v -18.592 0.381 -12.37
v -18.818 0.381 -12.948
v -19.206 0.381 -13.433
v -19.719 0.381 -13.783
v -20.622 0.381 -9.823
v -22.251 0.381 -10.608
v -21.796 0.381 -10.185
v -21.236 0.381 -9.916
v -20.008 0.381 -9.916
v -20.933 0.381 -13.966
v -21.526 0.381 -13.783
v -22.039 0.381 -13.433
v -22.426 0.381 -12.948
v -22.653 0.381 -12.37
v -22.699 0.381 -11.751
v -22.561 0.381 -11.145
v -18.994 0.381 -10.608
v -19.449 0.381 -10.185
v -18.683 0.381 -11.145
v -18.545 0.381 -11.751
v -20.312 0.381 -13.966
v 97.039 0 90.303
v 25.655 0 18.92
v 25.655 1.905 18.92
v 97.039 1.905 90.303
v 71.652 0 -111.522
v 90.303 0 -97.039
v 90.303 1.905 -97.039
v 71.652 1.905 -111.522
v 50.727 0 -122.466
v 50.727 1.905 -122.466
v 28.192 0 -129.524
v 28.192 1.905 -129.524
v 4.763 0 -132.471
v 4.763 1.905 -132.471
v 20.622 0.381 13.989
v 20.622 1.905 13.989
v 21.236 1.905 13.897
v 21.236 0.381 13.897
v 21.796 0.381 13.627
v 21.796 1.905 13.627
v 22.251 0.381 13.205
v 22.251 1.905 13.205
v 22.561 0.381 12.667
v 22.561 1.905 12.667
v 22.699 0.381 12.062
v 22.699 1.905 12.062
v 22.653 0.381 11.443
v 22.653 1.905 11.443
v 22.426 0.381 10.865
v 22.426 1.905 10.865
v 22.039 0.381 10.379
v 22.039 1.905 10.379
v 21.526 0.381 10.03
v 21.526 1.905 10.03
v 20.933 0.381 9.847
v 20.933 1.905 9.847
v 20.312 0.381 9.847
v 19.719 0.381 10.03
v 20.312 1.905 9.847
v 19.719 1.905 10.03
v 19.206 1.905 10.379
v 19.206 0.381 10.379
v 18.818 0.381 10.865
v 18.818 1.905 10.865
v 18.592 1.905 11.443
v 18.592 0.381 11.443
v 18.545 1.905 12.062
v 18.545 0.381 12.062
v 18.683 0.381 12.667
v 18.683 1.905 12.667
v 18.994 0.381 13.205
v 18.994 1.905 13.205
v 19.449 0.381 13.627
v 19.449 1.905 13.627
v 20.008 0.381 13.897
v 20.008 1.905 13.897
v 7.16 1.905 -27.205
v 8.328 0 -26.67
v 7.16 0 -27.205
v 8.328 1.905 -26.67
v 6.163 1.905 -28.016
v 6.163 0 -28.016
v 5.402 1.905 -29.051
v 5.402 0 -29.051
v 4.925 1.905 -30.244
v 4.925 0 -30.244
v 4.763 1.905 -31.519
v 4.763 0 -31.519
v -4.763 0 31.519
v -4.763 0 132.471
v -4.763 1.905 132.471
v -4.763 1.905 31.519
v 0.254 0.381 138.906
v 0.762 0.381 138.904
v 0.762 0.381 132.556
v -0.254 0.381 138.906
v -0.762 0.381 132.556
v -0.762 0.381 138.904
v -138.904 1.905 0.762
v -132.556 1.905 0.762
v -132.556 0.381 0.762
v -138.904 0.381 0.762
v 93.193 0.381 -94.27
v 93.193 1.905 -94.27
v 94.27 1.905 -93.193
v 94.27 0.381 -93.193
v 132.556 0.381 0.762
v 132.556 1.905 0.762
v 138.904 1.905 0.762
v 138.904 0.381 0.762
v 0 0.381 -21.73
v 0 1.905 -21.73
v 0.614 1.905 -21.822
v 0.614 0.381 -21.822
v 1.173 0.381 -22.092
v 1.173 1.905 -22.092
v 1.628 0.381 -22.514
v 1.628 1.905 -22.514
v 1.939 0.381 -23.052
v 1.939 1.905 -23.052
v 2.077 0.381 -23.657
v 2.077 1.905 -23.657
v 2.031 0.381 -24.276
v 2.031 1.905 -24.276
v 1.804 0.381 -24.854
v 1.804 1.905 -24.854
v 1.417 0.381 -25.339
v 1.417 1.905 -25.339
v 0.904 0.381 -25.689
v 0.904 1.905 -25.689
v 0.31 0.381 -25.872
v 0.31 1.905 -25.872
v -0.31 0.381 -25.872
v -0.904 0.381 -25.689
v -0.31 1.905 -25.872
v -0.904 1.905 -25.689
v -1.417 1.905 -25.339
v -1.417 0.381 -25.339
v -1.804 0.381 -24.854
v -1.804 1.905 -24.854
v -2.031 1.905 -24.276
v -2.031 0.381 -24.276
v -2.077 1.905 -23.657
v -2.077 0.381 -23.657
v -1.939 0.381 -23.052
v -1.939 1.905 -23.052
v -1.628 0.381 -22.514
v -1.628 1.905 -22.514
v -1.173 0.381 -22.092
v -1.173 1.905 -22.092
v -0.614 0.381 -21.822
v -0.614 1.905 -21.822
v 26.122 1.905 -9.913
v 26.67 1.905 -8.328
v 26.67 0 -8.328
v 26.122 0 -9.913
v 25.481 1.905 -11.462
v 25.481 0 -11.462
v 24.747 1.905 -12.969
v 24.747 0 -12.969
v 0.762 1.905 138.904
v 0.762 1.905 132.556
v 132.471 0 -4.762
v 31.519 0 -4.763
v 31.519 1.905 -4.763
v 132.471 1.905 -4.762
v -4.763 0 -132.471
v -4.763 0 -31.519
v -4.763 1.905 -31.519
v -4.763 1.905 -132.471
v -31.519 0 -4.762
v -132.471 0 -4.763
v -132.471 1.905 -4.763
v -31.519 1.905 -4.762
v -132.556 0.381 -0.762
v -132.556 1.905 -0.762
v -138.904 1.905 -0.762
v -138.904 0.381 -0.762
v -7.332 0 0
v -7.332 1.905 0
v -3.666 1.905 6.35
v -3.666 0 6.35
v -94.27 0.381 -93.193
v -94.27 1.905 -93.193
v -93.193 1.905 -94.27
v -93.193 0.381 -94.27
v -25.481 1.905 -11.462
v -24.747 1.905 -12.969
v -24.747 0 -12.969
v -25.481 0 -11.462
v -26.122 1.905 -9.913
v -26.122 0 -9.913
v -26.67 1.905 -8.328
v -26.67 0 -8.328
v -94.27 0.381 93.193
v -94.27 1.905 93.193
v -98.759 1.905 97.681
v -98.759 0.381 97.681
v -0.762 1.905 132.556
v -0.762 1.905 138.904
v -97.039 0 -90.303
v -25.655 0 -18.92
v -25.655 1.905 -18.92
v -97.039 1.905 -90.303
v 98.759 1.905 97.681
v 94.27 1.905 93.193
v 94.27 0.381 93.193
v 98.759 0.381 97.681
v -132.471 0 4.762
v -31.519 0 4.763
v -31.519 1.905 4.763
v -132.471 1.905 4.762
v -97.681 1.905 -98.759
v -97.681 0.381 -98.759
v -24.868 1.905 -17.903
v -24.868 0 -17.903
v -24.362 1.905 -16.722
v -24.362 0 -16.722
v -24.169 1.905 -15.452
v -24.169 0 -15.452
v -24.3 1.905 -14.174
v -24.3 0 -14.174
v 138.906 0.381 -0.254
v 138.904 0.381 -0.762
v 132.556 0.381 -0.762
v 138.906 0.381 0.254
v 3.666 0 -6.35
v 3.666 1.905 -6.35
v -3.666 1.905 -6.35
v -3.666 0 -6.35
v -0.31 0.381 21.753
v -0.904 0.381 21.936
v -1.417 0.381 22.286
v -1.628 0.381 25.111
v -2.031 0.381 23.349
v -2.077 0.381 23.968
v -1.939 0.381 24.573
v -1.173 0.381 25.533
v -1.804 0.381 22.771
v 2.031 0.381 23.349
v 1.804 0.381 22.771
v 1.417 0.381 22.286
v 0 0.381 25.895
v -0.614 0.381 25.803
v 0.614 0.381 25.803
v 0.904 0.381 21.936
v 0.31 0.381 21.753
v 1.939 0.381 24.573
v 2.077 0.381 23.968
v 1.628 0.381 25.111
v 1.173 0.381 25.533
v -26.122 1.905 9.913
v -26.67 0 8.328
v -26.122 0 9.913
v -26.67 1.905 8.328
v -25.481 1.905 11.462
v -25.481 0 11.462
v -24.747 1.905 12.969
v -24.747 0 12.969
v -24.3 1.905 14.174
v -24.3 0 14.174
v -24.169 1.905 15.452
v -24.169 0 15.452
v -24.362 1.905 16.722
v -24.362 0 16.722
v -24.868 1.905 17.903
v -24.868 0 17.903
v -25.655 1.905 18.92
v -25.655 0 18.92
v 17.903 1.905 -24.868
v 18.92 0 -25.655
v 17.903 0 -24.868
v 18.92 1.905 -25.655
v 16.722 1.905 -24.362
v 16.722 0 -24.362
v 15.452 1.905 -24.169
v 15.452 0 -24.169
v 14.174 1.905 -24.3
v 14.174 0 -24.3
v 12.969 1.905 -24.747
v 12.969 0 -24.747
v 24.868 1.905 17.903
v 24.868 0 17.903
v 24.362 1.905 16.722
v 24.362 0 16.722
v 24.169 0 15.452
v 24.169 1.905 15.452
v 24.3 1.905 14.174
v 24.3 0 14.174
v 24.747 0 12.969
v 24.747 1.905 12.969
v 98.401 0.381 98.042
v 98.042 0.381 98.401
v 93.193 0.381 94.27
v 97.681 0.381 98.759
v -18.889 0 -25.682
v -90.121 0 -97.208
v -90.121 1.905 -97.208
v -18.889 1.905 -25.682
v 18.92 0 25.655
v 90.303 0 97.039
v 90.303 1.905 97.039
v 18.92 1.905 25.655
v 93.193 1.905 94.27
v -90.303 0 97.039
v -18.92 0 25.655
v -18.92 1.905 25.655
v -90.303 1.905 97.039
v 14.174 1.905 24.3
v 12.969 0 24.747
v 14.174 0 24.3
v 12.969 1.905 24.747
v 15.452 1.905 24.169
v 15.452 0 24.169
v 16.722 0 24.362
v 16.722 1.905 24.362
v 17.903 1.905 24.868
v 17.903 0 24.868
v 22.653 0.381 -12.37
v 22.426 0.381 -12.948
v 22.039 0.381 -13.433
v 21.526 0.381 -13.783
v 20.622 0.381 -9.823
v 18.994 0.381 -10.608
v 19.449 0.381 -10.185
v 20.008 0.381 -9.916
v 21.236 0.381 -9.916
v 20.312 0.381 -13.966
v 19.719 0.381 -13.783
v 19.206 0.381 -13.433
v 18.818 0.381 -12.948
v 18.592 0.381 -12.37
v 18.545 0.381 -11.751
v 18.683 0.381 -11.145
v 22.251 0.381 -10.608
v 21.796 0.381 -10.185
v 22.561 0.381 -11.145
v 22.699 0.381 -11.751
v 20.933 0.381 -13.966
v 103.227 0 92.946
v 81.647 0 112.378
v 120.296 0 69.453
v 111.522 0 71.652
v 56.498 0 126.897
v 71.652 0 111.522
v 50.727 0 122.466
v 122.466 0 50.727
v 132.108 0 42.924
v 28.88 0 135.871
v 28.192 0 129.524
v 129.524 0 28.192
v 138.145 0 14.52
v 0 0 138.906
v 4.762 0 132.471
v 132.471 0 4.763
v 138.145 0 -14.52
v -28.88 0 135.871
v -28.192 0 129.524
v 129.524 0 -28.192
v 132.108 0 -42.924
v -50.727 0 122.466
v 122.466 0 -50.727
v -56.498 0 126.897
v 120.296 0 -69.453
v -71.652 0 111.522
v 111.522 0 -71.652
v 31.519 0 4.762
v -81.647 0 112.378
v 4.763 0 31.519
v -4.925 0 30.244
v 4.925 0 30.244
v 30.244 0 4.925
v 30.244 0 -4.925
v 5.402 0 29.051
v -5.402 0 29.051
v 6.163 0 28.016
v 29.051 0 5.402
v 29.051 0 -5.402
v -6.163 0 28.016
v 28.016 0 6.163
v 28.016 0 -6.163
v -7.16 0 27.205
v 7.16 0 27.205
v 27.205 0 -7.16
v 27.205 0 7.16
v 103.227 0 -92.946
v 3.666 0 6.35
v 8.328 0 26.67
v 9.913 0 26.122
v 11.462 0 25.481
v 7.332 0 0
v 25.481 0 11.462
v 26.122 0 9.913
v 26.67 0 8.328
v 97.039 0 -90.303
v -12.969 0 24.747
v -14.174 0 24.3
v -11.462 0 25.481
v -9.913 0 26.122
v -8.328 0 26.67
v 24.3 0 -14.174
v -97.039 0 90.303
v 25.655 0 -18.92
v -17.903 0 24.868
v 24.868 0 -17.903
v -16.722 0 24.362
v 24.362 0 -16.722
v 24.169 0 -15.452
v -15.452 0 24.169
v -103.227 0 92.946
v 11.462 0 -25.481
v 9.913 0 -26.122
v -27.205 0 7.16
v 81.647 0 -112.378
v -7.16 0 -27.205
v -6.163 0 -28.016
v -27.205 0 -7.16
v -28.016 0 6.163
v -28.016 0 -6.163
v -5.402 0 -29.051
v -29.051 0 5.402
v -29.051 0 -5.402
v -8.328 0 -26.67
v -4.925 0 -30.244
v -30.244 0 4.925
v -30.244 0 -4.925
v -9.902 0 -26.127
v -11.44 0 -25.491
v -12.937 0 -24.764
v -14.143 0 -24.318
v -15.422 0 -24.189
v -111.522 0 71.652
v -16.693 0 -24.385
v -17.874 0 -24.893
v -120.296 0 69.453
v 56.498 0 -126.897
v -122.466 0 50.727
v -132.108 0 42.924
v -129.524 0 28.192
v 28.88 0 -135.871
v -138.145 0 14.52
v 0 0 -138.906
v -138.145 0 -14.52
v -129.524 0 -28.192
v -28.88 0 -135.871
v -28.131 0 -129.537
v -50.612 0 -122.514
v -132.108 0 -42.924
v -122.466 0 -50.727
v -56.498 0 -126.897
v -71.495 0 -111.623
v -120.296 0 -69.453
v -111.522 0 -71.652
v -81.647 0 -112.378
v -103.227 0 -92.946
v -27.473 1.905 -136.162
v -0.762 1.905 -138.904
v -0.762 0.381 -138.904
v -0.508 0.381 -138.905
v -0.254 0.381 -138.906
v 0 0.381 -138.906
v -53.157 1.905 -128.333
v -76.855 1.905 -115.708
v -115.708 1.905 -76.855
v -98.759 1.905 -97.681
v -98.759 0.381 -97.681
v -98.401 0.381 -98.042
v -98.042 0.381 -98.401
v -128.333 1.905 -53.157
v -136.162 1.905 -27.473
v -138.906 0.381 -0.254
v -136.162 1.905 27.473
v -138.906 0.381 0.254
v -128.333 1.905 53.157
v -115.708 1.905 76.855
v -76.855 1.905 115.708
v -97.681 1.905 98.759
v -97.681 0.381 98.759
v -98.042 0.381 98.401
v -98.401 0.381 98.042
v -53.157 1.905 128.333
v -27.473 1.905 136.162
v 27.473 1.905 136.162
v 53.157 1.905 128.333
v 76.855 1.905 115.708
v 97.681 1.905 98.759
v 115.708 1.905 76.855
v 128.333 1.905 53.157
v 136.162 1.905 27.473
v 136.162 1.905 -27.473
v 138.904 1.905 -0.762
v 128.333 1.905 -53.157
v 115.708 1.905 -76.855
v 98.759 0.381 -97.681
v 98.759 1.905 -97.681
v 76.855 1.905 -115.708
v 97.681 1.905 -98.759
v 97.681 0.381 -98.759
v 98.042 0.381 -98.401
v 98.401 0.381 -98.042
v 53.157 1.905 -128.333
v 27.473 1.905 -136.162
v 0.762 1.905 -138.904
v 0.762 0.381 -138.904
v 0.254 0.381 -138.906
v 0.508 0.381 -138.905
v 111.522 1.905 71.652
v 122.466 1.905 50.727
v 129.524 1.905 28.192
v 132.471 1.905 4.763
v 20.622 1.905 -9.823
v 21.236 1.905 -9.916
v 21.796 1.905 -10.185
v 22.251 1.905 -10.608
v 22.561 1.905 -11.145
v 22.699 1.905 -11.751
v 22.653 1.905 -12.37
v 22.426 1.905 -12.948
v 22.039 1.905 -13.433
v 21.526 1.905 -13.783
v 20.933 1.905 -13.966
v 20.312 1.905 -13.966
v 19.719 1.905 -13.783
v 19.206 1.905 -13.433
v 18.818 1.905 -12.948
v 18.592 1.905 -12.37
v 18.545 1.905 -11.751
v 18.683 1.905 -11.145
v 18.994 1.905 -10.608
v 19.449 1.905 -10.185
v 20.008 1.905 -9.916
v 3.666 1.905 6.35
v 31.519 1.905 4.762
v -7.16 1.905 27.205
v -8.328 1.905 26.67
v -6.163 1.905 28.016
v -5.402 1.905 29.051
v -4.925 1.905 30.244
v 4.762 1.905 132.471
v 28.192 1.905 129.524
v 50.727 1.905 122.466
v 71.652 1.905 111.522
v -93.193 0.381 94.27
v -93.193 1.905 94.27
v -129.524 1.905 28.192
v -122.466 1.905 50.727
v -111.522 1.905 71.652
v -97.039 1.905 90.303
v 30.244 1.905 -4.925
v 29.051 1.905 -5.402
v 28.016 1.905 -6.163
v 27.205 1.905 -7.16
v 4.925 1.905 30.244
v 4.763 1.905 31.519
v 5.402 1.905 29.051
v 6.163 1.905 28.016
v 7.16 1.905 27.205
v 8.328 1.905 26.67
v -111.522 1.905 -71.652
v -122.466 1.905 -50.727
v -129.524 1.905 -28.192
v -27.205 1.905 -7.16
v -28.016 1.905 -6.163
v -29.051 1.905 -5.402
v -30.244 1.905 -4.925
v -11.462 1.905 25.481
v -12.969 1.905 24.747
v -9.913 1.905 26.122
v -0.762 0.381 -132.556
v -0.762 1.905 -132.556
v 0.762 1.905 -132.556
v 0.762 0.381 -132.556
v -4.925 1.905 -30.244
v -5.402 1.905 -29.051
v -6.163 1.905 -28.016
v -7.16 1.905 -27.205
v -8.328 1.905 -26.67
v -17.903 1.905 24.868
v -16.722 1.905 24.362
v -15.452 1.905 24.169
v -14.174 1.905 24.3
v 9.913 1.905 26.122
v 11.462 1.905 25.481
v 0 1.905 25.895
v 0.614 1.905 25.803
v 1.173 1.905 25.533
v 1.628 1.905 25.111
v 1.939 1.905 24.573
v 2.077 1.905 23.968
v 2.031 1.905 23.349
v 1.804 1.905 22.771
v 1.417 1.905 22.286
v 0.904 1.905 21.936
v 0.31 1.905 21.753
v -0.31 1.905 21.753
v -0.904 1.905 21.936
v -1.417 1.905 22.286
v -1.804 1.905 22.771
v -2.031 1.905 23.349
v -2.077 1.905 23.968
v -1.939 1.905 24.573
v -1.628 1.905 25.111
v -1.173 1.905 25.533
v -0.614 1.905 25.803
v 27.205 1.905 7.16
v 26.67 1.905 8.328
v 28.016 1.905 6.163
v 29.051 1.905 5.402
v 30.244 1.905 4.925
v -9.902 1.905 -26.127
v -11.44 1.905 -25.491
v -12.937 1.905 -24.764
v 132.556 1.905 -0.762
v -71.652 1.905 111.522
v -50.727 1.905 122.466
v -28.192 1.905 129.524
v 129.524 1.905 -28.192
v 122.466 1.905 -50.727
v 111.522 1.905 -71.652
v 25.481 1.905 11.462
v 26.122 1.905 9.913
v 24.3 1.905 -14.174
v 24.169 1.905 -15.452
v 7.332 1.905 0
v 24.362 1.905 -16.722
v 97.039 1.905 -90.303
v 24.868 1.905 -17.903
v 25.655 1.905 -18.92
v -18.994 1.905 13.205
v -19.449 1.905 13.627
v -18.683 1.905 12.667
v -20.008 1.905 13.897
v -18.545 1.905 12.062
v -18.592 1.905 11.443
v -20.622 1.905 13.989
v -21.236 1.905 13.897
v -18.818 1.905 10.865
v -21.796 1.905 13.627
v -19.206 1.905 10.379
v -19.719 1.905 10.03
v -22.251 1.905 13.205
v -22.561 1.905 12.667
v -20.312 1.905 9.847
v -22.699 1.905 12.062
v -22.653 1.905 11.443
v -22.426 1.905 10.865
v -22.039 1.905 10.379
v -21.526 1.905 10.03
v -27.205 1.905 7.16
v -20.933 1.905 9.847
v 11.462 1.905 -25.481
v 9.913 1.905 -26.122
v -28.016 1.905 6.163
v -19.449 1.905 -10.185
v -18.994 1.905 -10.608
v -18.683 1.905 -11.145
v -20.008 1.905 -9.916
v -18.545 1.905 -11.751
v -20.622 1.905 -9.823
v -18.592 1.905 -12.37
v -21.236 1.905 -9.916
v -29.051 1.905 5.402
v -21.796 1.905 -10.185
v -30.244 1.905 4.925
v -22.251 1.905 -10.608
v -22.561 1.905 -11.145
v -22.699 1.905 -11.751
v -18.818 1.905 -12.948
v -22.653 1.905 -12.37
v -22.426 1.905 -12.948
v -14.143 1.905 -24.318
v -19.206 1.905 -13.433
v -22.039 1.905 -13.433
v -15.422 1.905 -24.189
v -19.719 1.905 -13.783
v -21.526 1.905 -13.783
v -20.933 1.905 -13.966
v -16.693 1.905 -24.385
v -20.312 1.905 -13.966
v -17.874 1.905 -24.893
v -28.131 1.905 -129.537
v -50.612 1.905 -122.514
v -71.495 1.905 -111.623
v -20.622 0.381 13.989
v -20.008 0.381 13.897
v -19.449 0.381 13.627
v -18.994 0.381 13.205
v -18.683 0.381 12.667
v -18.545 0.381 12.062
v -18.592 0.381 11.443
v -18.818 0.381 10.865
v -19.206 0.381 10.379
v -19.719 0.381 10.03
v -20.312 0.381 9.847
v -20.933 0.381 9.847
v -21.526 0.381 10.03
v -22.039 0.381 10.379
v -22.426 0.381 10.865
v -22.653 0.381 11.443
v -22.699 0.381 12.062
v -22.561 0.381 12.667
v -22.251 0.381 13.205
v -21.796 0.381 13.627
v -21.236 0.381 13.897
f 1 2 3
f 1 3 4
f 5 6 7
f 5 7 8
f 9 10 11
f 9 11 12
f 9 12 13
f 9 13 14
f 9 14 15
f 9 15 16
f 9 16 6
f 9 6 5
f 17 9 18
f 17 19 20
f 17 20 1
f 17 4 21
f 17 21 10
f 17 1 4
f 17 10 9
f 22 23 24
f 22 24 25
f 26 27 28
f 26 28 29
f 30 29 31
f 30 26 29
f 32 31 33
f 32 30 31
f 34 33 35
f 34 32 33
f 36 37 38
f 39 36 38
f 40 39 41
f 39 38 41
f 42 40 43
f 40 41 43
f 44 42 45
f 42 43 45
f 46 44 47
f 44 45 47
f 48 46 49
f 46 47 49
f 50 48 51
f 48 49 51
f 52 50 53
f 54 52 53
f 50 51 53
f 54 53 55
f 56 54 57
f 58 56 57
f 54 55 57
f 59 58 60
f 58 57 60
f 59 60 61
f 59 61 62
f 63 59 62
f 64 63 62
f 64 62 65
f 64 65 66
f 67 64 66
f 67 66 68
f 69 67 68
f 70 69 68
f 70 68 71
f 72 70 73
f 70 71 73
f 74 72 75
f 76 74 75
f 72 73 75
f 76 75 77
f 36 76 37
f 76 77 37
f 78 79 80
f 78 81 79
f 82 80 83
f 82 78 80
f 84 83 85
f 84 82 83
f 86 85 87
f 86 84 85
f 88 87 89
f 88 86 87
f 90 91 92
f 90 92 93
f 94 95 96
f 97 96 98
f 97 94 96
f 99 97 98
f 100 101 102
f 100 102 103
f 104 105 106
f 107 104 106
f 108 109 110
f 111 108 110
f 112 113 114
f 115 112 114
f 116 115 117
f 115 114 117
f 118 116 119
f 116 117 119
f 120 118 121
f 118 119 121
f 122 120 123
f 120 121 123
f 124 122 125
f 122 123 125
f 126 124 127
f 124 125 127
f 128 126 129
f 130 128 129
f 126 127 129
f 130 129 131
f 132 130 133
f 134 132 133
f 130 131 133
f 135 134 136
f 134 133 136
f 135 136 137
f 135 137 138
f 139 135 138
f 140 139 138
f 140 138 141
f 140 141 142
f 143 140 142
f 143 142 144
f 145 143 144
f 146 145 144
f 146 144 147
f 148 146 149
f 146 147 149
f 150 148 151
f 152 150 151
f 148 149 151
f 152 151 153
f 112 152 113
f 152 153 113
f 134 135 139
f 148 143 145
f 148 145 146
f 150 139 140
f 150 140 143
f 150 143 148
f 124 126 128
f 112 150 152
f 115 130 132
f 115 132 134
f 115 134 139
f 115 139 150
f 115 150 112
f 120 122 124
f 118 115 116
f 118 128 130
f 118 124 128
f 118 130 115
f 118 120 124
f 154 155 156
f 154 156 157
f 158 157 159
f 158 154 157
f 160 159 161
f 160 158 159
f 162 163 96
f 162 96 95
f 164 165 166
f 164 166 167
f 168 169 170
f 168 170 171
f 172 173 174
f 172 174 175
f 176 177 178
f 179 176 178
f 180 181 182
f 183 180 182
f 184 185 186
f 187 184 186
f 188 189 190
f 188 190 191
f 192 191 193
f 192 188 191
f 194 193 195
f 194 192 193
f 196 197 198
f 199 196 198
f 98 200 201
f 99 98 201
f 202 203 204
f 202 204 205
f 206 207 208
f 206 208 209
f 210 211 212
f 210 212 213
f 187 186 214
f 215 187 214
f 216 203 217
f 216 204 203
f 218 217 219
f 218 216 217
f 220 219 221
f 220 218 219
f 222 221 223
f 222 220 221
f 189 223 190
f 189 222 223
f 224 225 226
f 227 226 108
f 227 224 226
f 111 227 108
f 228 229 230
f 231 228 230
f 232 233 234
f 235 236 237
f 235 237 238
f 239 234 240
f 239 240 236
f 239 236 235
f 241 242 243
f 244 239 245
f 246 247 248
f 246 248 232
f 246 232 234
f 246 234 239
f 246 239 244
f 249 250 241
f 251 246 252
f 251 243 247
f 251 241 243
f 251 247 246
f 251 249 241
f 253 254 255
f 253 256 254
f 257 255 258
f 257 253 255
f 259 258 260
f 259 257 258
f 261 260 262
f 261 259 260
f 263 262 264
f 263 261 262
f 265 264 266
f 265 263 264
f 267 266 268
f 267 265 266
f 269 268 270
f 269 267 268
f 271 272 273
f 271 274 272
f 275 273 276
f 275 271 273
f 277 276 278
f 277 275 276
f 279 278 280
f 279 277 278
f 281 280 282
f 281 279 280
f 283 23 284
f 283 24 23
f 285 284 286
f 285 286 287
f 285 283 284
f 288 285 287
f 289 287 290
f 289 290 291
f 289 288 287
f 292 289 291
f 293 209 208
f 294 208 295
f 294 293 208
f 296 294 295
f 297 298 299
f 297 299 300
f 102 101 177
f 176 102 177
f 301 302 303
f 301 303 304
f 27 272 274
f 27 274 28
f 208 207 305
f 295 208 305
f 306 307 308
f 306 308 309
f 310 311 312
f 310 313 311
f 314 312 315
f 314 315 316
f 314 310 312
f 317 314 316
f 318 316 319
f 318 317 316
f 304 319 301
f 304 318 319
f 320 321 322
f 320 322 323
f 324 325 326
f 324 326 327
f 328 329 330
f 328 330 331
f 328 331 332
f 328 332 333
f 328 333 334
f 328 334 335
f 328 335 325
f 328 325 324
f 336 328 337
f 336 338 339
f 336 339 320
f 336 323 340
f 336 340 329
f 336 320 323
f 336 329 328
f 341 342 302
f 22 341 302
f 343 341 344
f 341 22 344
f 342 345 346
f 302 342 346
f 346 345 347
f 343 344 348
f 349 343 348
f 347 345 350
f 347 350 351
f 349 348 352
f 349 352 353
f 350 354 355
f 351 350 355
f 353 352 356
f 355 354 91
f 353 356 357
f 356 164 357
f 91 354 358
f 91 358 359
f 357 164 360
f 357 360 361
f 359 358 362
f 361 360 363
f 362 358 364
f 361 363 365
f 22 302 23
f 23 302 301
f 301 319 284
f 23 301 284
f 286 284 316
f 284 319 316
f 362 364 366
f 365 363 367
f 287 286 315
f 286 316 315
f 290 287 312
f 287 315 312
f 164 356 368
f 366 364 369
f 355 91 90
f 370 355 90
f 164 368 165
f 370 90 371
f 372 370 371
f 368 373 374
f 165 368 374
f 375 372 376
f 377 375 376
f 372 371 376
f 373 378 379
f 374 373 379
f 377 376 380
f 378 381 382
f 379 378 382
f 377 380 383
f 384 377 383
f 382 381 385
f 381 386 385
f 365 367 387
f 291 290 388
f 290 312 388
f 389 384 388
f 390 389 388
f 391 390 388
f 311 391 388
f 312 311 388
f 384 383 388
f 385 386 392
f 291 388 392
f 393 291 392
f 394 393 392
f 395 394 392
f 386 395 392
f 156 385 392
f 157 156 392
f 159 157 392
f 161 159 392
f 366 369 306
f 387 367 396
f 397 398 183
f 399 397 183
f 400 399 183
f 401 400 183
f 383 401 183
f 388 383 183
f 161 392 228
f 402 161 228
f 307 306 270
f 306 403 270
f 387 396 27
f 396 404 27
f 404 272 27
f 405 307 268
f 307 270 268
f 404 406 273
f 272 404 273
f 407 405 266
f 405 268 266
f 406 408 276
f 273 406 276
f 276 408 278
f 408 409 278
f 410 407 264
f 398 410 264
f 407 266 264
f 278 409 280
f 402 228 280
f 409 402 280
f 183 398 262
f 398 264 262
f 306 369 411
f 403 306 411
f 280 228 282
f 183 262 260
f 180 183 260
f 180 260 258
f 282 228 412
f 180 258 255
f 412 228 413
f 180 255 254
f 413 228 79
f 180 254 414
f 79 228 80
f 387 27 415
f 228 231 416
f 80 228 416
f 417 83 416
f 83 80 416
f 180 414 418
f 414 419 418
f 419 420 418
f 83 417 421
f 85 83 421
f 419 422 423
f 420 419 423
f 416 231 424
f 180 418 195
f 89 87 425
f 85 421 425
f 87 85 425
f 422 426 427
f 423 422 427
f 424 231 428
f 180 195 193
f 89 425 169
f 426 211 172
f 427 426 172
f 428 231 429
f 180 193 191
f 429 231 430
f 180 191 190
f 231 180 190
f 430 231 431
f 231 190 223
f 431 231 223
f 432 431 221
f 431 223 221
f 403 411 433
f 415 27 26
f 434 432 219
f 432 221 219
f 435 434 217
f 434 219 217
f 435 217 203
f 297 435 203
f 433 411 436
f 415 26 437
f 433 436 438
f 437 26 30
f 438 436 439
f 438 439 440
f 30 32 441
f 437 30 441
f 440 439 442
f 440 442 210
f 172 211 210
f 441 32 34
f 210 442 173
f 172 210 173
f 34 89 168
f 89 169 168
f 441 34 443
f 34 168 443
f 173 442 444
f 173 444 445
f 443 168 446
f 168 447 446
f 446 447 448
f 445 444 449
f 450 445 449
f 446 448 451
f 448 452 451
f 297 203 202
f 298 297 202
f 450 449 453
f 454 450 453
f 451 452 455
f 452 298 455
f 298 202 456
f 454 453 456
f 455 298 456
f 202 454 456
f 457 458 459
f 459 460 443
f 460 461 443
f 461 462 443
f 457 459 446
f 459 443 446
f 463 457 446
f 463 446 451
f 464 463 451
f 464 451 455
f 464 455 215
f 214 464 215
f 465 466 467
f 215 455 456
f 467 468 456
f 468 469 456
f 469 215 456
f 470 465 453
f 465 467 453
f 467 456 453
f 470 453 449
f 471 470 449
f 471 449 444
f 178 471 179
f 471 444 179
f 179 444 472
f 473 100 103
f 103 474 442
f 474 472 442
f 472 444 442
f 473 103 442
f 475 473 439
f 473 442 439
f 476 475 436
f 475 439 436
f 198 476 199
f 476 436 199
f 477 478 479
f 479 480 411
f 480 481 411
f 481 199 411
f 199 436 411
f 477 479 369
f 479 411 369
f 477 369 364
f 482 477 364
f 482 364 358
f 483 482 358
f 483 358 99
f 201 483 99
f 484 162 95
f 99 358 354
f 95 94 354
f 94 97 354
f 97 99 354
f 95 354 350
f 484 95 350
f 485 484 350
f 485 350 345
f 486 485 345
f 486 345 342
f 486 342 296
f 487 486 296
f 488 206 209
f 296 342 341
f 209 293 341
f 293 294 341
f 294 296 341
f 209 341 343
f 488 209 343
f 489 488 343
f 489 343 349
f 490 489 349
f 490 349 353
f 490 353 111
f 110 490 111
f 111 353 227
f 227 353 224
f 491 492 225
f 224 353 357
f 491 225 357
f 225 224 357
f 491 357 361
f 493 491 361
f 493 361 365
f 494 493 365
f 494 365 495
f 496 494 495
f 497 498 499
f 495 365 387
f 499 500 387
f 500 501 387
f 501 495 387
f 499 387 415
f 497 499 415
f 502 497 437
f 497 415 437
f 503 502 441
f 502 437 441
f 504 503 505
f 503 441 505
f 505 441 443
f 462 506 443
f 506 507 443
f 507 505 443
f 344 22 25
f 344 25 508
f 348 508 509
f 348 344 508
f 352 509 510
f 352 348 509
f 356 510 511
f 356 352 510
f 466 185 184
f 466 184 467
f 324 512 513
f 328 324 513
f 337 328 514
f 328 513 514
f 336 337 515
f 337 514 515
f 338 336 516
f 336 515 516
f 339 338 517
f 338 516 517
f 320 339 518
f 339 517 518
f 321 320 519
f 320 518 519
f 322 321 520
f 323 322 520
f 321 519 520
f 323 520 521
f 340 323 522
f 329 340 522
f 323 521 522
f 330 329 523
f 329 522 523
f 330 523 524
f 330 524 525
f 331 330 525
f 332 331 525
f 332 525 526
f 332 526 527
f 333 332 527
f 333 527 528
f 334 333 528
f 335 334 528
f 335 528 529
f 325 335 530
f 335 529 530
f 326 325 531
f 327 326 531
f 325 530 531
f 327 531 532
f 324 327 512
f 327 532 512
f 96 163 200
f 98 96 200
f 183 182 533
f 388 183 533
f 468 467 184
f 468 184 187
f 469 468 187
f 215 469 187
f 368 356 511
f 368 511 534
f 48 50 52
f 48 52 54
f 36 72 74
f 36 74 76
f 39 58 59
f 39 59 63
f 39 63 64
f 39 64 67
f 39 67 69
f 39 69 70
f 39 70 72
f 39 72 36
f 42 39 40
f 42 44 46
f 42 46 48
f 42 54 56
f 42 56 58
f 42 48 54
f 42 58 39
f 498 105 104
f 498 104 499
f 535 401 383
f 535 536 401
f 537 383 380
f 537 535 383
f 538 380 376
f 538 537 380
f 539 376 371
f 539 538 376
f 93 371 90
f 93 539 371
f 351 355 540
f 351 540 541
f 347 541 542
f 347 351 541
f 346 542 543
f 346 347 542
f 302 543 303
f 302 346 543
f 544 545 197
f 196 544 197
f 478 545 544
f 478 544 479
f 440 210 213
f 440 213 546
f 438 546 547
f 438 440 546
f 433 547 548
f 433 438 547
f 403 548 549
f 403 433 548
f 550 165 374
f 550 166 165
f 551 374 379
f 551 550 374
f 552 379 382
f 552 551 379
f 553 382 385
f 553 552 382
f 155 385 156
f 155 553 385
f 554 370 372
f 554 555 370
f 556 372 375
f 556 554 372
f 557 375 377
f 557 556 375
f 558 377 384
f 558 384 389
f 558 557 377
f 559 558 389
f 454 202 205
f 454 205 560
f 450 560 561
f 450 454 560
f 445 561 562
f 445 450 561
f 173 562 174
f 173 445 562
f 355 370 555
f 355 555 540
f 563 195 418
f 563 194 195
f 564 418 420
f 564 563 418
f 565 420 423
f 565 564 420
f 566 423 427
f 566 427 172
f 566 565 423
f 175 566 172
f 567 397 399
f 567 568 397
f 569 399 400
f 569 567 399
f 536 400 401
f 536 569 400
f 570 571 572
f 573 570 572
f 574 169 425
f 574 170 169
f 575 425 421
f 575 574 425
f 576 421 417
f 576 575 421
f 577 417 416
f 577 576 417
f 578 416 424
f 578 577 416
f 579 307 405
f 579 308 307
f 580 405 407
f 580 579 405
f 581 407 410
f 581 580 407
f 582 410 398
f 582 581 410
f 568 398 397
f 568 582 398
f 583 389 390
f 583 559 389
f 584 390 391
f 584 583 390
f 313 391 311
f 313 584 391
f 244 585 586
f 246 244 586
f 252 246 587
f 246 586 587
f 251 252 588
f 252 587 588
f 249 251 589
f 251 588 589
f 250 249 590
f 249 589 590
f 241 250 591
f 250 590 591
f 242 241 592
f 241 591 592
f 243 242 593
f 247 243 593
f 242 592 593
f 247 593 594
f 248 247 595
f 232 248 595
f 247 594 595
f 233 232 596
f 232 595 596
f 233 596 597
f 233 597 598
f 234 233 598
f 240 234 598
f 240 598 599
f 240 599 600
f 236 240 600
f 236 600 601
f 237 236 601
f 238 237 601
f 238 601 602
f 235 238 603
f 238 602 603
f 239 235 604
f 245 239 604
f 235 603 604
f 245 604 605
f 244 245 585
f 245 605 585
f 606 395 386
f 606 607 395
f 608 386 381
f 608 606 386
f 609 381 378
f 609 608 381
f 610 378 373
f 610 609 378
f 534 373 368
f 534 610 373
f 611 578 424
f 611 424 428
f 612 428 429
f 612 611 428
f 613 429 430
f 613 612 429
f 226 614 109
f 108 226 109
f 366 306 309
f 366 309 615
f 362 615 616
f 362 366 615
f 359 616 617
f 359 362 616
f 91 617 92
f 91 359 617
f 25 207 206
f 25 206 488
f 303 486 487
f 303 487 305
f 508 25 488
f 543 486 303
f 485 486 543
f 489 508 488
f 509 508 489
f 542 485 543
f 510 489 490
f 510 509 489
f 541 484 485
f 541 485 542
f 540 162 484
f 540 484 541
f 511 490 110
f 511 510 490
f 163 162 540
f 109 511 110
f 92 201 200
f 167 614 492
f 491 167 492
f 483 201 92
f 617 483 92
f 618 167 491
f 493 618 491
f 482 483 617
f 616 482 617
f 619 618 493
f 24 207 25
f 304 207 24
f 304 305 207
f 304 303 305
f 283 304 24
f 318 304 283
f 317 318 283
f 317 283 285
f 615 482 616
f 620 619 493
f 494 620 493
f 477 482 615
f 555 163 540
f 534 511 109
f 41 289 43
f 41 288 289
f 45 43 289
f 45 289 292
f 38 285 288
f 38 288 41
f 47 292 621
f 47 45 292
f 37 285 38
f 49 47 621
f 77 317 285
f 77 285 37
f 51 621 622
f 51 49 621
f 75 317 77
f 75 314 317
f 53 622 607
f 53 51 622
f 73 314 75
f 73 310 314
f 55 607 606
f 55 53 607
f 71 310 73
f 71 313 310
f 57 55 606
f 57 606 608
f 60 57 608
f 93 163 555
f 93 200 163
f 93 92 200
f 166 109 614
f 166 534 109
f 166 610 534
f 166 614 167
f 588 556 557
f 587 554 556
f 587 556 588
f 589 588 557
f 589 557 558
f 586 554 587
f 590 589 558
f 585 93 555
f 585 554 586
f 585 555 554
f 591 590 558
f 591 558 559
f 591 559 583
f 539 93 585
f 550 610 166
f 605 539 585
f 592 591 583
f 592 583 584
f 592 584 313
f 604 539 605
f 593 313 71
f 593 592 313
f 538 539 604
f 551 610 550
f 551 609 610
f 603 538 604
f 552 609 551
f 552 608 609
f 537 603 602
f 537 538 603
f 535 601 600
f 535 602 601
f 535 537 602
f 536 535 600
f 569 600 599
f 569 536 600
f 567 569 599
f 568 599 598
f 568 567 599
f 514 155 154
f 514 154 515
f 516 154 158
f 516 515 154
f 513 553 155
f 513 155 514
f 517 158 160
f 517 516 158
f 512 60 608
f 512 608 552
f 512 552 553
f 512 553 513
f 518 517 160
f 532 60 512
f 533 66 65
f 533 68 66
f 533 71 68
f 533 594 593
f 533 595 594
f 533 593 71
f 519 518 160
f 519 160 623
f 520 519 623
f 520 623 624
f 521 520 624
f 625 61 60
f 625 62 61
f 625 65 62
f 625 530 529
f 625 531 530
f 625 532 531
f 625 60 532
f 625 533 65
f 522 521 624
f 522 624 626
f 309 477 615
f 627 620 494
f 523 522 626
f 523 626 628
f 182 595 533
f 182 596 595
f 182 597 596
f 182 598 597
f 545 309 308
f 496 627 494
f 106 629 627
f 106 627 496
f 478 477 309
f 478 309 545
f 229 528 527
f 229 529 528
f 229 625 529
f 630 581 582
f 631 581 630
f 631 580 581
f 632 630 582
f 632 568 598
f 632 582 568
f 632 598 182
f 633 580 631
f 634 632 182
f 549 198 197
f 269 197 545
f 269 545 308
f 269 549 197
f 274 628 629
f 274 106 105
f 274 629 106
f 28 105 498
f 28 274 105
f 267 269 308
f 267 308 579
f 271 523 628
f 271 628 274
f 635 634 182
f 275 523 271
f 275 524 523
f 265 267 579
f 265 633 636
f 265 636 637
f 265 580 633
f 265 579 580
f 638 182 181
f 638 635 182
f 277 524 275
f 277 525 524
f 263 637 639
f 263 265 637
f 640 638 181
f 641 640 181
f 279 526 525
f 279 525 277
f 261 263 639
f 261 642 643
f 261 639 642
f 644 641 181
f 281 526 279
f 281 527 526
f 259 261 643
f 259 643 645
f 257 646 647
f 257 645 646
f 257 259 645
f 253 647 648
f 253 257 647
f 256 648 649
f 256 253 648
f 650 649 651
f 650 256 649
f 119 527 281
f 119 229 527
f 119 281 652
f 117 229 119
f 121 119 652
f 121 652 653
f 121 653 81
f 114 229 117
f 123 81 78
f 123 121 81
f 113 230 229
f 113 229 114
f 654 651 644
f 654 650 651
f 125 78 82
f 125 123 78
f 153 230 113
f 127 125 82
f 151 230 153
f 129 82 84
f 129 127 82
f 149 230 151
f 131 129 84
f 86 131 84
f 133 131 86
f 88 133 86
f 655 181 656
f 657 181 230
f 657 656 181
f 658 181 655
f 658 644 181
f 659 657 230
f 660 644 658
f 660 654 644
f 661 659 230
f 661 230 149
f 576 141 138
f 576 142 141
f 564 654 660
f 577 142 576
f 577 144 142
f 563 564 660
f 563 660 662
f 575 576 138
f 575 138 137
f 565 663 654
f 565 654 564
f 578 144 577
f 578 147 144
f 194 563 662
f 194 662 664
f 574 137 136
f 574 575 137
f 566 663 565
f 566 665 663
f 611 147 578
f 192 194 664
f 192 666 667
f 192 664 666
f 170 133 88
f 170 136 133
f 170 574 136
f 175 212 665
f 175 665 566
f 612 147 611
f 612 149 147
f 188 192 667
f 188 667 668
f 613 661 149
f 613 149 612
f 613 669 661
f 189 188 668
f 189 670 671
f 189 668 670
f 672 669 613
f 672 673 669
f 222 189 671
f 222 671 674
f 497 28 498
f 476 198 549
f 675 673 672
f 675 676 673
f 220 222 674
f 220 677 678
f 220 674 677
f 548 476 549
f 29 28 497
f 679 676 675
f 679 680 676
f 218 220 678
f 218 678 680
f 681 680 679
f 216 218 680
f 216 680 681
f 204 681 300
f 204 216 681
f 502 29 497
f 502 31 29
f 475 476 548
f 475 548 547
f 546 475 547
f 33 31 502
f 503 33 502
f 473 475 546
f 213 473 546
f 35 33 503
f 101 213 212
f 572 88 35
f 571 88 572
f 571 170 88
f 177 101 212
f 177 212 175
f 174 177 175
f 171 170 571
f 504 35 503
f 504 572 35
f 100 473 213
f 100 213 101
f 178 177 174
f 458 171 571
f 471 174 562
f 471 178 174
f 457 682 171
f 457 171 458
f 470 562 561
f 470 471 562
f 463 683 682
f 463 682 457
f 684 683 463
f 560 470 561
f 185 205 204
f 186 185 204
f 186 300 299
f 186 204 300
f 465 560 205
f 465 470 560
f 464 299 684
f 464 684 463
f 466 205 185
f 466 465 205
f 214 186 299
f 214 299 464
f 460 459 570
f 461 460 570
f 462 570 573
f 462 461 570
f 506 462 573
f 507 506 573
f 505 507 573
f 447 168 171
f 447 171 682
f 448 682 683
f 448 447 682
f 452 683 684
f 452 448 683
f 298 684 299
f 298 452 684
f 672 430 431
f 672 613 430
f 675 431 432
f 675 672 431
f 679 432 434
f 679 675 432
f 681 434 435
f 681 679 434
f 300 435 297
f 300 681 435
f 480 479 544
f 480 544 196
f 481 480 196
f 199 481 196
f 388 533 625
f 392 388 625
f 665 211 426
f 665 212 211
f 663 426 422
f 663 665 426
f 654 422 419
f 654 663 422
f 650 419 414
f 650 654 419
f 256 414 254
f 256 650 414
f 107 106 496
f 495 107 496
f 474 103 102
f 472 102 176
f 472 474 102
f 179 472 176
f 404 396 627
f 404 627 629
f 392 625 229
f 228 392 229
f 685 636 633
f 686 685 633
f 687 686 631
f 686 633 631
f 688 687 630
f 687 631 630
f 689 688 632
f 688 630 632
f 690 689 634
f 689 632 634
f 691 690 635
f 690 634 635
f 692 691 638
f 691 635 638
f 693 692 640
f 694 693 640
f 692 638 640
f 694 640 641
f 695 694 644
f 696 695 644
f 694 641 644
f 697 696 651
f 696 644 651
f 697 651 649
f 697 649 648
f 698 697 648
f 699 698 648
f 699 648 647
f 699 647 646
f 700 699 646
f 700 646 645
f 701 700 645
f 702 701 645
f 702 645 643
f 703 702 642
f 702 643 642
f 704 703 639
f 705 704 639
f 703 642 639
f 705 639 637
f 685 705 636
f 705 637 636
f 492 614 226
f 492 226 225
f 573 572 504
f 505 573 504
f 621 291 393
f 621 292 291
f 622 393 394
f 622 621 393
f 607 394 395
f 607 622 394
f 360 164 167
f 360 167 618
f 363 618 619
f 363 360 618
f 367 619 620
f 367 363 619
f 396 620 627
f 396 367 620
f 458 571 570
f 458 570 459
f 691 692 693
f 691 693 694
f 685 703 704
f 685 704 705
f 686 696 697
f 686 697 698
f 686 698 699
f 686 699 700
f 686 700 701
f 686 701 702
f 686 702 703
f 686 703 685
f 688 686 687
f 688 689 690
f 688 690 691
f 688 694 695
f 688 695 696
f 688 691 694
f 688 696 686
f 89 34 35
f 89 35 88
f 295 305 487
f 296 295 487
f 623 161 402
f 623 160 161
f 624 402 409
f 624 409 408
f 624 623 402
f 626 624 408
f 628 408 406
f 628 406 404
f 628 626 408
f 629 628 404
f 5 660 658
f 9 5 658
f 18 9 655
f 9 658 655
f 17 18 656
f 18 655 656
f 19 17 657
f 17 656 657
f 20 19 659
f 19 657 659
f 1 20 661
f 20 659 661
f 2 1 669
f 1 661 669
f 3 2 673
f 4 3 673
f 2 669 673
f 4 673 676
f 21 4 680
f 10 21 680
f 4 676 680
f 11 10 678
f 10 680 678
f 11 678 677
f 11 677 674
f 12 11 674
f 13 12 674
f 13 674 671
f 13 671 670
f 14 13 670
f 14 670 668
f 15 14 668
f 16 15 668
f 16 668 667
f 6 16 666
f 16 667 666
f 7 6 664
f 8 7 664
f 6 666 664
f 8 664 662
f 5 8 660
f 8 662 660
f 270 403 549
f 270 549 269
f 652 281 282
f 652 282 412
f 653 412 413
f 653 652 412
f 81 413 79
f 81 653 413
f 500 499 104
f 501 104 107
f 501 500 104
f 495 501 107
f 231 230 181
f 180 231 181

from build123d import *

# Parameters (mm, degrees)
SKETCH1_R           = 138.90625
BOSS_EXTRUDE1_DEPTH = 1.905
SKETCH2_R           = 27.94
BOSS_EXTRUDE2_DEPTH = 1.905
SKETCH3_R           = 2.0828
CUT_EXTRUDE1_DEPTH  = 1.524
FILLET1_R           = 5.08
SKETCH4_W           = 1.524
SKETCH4_H           = 6.35
CUT_EXTRUDE2_DEPTH  = 1.524
CIRPATTERN1_COUNT   = 8
CUT_EXTRUDE3_DEPTH  = 197.452339266


with BuildPart() as part:
    # Sketch1 → Boss-Extrude1 (new body)
    with BuildSketch(Plane(origin=(0, 0, 0), x_dir=(1, 0, 0), z_dir=(0, 1, 0))):
        with Locations(Location((0, 0, 0), (0, 0, 90))):
            Circle(SKETCH1_R)
        with BuildLine():
            ThreePointArc((-97.038504037, 90.303311946), (-122.466006281, 50.727080731), (-132.470668481, 4.7625))
            Line((-132.470668481, 4.7625), (-11.497692091, 4.7625))
            Line((-11.497692091, 4.7625), (-97.038504037, 90.303311946))
        make_face(mode=Mode.SUBTRACT)
        with BuildLine():
            ThreePointArc((-132.470668481, -4.7625), (-122.466006281, -50.727080731), (-97.038504037, -90.303311946))
            Line((-97.038504037, -90.303311946), (-11.497692091, -4.7625))
            Line((-11.497692091, -4.7625), (-132.470668481, -4.7625))
        make_face(mode=Mode.SUBTRACT)
        with BuildLine():
            ThreePointArc((-90.303311946, -97.038504037), (-50.727080731, -122.466006281), (-4.7625, -132.470668481))
            Line((-4.7625, -132.470668481), (-4.7625, -11.497692091))
            Line((-4.7625, -11.497692091), (-90.303311946, -97.038504037))
        make_face(mode=Mode.SUBTRACT)
        with BuildLine():
            ThreePointArc((4.7625, -132.470668481), (50.727080731, -122.466006281), (90.303311946, -97.038504037))
            Line((90.303311946, -97.038504037), (4.7625, -11.497692091))
            Line((4.7625, -11.497692091), (4.7625, -132.470668481))
        make_face(mode=Mode.SUBTRACT)
        with BuildLine():
            ThreePointArc((97.038504037, -90.303311946), (122.466006281, -50.727080731), (132.470668481, -4.7625))
            Line((132.470668481, -4.7625), (11.497692091, -4.7625))
            Line((11.497692091, -4.7625), (97.038504037, -90.303311946))
        make_face(mode=Mode.SUBTRACT)
        with BuildLine():
            ThreePointArc((132.470668481, 4.7625), (122.466006281, 50.727080731), (97.038504037, 90.303311946))
            Line((97.038504037, 90.303311946), (11.497692091, 4.7625))
            Line((11.497692091, 4.7625), (132.470668481, 4.7625))
        make_face(mode=Mode.SUBTRACT)
        with BuildLine():
            ThreePointArc((90.303311946, 97.038504037), (50.727080731, 122.466006281), (4.7625, 132.470668481))
            Line((4.7625, 132.470668481), (4.7625, 11.497692091))
            Line((4.7625, 11.497692091), (90.303311946, 97.038504037))
        make_face(mode=Mode.SUBTRACT)
        with BuildLine():
            ThreePointArc((-4.7625, 132.470668481), (-50.612212833, 122.513523034), (-90.121152576, 97.207701714))
            Line((-90.121152576, 97.207701714), (-4.7625, 11.497692091))
            Line((-4.7625, 11.497692091), (-4.7625, 132.470668481))
        make_face(mode=Mode.SUBTRACT)
    extrude(amount=BOSS_EXTRUDE1_DEPTH)

    # Sketch2 → Boss-Extrude2 (add)
    with BuildSketch(Plane(origin=(0, 1.905, 0), x_dir=(1, 0, 0), z_dir=(0, 1, 0))):
        Circle(SKETCH2_R)
    extrude(amount=-BOSS_EXTRUDE2_DEPTH)

    # Sketch3 → Cut-Extrude1 (cut)
    with BuildSketch(Plane(origin=(0, 1.905, 0), x_dir=(1, 0, 0), z_dir=(0, 1, 0))):
        with Locations(Location((0, 23.8125, 0), (0, 0, 270))):
            Circle(SKETCH3_R)
        with Locations(Location((20.622229928, 11.90625, 0), (0, 0, 270))):
            Circle(SKETCH3_R)
        with Locations(Location((20.622229928, -11.90625, 0), (0, 0, 270))):
            Circle(SKETCH3_R)
        with Locations(Location((0, -23.8125, 0), (0, 0, 270))):
            Circle(SKETCH3_R)
        with Locations(Location((-20.622229928, -11.90625, 0), (0, 0, 270))):
            Circle(SKETCH3_R)
        with Locations(Location((-20.622229928, 11.90625, 0), (0, 0, 270))):
            Circle(SKETCH3_R)
    extrude(amount=-CUT_EXTRUDE1_DEPTH, mode=Mode.SUBTRACT)

    # Fillet1
    fillet1_edges = [part.edges().sort_by_distance(p)[0] for p in [
        (-16.072522378, 0.9525, -22.854269282),
        (4.7625, 0.9525, -27.531113195),
        (22.835032879, 0.9525, -16.099840788),
        (27.531113195, 0.9525, 4.7625),
        (16.099840788, 0.9525, 22.835032879),
        (-4.7625, 0.9525, 27.531113195),
        (-22.835032879, 0.9525, 16.099840788),
        (-27.531113195, 0.9525, -4.7625),
        (-22.835032879, 0.9525, -16.099840788),
        (-4.7625, 0.9525, -27.531113195),
        (16.099840788, 0.9525, -22.835032879),
        (27.531113195, 0.9525, -4.7625),
        (22.835032879, 0.9525, 16.099840788),
        (4.7625, 0.9525, 27.531113195),
        (-16.099840788, 0.9525, 22.835032879),
        (-27.531113195, 0.9525, 4.7625),
    ]]
    fillet(fillet1_edges, radius=FILLET1_R)

    # Sketch4 → Cut-Extrude2 (cut)
    with BuildSketch(Plane(origin=(0, 1.905, 0), x_dir=(1, 0, 0), z_dir=(0, 1, 0))):
        with Locations((0, 135.73125)):
            Rectangle(SKETCH4_W, SKETCH4_H)
    cut_extrude2 = extrude(amount=-CUT_EXTRUDE2_DEPTH, mode=Mode.SUBTRACT)

    # CirPattern1: Cut-Extrude2 ×8 about axis
    cirpattern1_axis = Axis((0, 0, 0), (0, 1, 0))
    for i in range(1, CIRPATTERN1_COUNT):
        add(cut_extrude2.rotate(cirpattern1_axis, i * 360 / CIRPATTERN1_COUNT), mode=Mode.SUBTRACT)

    # Sketch5 → Cut-Extrude3 (cut, through all)
    with BuildSketch(Plane(origin=(0, 1.905, 0), x_dir=(1, 0, 0), z_dir=(0, 1, 0))):
        Polygon((3.666174209, 6.35), (-3.666174209, 6.35), (-7.332348419, 0), (-3.666174209, -6.35), (3.666174209, -6.35), (7.332348419, 0), align=None)
    extrude(amount=-CUT_EXTRUDE3_DEPTH, mode=Mode.SUBTRACT)


solid = part.part
